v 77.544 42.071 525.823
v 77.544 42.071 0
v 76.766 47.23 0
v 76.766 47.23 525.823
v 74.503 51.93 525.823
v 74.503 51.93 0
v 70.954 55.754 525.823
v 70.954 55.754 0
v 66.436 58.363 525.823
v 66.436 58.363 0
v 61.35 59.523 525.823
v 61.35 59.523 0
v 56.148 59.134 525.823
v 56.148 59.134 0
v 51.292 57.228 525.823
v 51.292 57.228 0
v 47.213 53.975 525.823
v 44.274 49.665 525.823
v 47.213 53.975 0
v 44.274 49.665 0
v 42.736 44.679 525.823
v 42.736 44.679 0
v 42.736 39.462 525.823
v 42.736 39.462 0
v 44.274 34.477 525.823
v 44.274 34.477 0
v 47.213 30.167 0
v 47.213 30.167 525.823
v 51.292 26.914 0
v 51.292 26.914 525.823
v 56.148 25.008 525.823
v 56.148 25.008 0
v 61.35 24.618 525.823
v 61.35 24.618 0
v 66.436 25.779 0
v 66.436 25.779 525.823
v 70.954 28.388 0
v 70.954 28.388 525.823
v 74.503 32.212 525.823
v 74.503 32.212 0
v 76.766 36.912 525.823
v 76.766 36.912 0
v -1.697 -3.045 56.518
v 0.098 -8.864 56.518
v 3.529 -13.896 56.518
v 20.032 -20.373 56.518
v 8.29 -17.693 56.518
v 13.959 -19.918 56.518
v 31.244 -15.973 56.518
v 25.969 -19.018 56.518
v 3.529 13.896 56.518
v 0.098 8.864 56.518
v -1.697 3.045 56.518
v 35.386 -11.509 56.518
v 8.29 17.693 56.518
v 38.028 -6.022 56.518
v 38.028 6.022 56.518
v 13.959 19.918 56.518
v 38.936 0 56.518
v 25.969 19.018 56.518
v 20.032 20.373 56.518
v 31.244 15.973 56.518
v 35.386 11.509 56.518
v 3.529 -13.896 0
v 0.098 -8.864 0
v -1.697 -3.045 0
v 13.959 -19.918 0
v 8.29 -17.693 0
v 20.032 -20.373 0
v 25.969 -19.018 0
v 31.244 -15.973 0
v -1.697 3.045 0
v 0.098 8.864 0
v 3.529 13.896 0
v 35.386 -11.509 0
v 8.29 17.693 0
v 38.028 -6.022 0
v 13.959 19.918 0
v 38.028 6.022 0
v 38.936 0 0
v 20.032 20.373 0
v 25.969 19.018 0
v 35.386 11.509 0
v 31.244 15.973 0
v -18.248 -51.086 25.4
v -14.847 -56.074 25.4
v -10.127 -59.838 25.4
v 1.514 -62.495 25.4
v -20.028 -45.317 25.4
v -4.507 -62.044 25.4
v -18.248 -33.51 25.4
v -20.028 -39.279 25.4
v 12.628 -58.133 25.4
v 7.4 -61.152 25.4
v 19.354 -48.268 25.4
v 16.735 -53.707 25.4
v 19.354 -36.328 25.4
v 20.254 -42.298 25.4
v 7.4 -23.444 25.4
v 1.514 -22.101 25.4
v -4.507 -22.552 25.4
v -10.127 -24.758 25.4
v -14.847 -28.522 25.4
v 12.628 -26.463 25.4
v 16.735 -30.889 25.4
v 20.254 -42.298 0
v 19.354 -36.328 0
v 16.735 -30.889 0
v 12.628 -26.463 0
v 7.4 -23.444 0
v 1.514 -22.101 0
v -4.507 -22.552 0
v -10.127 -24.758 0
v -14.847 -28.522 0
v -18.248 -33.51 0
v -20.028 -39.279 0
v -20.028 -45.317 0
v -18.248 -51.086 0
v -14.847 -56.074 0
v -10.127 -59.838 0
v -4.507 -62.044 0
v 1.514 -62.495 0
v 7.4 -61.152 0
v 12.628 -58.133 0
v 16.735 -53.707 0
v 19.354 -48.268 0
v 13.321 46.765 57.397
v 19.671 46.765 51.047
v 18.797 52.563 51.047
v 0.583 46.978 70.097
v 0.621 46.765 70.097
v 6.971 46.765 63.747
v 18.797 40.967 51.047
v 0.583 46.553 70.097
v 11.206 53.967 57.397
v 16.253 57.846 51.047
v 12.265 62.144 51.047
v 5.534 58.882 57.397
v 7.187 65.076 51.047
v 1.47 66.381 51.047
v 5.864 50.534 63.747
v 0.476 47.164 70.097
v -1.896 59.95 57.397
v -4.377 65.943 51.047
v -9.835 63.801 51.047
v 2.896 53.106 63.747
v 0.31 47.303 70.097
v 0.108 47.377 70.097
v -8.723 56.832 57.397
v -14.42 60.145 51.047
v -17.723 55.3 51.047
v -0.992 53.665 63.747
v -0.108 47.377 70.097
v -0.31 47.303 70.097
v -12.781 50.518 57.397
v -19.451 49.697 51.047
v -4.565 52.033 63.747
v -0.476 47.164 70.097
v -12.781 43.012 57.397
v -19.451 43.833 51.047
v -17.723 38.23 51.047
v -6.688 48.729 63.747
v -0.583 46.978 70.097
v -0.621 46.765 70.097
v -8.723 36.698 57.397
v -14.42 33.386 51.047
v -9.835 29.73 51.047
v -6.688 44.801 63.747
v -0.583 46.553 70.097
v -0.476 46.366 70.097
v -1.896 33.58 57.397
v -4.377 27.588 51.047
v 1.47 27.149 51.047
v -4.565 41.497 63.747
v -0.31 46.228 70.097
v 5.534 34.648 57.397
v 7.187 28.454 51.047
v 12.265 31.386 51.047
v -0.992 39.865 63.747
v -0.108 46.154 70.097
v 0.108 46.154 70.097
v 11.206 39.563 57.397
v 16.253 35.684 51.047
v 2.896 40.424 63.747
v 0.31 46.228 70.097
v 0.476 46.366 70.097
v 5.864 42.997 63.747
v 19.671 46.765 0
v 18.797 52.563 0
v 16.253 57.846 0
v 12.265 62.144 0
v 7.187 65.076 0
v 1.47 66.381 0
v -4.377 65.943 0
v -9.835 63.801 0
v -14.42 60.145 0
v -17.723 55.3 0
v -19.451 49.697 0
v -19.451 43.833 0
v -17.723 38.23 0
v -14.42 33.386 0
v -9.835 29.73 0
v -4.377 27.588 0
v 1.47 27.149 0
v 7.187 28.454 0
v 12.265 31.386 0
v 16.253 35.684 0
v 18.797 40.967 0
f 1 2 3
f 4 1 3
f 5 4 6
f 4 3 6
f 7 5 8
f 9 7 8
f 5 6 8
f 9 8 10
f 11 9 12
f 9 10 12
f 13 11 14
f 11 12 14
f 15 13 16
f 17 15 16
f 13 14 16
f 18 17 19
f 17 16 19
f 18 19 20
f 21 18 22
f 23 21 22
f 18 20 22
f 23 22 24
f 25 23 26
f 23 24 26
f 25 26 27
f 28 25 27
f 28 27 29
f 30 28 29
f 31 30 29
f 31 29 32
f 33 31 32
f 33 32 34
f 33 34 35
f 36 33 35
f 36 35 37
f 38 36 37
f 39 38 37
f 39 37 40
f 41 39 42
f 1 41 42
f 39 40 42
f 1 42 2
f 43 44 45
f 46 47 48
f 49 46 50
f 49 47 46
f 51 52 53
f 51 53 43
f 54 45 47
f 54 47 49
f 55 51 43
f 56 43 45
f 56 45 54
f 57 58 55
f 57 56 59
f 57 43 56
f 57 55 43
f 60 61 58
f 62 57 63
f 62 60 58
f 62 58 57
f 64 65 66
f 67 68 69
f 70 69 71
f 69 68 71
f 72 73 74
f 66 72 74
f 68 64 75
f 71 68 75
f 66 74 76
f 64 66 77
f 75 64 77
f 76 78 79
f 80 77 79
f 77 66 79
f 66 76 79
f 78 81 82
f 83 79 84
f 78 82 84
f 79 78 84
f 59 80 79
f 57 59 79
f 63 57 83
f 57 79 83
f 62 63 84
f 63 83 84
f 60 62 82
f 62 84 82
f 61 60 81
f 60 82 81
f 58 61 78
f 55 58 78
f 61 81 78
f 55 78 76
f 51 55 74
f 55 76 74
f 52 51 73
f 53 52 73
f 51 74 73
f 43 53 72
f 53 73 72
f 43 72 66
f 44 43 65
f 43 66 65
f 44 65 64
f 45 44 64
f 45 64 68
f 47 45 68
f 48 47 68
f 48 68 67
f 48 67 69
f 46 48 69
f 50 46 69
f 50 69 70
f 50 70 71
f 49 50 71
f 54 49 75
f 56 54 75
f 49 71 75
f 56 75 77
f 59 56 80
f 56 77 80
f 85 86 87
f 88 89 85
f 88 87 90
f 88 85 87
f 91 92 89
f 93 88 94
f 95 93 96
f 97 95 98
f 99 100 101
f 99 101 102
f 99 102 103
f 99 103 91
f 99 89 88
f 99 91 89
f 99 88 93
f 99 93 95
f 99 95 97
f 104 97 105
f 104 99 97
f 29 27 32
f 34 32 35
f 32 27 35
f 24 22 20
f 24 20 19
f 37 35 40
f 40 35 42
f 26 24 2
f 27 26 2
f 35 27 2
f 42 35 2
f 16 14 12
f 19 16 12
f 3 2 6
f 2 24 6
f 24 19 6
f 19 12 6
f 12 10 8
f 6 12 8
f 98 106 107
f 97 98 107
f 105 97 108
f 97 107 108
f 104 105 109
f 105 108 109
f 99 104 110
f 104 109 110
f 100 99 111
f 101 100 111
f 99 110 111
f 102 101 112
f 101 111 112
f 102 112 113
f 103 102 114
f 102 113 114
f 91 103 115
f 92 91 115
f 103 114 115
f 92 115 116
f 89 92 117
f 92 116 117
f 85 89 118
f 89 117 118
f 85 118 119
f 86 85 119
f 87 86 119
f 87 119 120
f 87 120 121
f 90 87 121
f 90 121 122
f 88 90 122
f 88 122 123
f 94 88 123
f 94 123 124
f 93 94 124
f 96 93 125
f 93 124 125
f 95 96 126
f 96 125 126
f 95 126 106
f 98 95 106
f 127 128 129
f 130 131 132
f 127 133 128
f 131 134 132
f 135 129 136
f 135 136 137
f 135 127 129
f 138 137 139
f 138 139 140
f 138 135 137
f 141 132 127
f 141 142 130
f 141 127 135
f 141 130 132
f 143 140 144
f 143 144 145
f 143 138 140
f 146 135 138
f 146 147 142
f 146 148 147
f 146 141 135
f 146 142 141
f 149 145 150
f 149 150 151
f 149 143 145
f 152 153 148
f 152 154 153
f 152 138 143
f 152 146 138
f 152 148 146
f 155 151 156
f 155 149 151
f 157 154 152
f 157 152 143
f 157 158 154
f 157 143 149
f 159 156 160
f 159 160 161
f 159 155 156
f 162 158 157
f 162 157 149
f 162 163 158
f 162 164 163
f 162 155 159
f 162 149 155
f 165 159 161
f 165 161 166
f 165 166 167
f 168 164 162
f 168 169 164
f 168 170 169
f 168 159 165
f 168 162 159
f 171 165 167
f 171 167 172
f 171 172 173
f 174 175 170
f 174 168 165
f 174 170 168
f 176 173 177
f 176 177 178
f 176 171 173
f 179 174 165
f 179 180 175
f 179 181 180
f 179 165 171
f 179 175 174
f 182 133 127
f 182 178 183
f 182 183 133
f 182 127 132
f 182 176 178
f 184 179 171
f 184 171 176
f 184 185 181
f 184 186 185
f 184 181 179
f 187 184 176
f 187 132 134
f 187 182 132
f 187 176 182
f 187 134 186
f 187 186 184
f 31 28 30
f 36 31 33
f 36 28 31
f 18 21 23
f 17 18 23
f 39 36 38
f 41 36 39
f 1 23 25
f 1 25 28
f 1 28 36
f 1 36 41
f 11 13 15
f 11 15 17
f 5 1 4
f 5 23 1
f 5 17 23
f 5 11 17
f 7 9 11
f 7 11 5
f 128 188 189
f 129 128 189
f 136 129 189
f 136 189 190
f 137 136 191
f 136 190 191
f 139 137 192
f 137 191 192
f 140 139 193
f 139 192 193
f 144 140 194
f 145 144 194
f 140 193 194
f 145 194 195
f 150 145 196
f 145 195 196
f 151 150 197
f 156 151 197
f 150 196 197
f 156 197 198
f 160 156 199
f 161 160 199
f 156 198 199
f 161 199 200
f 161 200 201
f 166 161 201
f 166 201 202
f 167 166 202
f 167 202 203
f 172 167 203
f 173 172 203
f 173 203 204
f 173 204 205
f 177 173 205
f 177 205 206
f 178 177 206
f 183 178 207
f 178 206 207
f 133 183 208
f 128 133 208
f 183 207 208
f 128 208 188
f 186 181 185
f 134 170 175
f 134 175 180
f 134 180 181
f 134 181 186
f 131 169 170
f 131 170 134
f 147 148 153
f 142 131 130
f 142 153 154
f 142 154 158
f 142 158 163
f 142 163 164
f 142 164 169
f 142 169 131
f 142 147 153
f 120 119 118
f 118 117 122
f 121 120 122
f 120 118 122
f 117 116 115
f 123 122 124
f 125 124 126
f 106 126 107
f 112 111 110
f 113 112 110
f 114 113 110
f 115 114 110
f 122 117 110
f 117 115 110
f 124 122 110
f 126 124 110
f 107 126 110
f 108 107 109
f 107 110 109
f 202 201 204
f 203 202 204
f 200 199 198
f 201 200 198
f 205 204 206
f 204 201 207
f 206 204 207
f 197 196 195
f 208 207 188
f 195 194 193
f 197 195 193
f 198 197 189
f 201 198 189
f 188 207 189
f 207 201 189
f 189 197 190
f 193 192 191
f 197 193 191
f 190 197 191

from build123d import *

# Parameters (mm, degrees)
F0_R      = 20.43056521
F1_DEPTH  = 56.5179139376
F4_R      = 19.6707341592
F5_DEPTH  = 70.09729743
F6_SIZE   = 19.05
F7_R      = 20.2538361839
F8_DEPTH  = 25.4
F9_R      = 17.5014397404
F10_DEPTH = 525.8231759071


# Not quite as in the source:
# - the program builds the solid bodies; features that only make, move or delete a surface that nothing else refers to are left out


with BuildPart() as f1:
    # F0 (on Top) → F1 (new body)
    with BuildSketch(Plane.XY):
        with Locations((18.5053218156, 0)):
            Circle(F0_R)
    extrude(amount=F1_DEPTH)


with BuildPart() as f5:
    # F4 (on Top) → F5 (new body)
    with BuildSketch(Plane.XY):
        with Locations((0, 46.7652082443)):
            Circle(F4_R)
    extrude(amount=F5_DEPTH)

    # F6
    f6_edges = [f5.edges().sort_by_distance(p)[0] for p in [
        (-19.670734, 46.765208, 70.097297),
    ]]
    chamfer(f6_edges, length=F6_SIZE)


with BuildPart() as f8:
    # F7 (on Top) → F8 (new body)
    with BuildSketch(Plane.XY):
        with Locations((0, -42.2979965806)):
            Circle(F7_R)
    extrude(amount=F8_DEPTH)


with BuildPart() as f10:
    # F9 (on Top) → F10 (new body)
    with BuildSketch(Plane.XY):
        with Locations((60.0422769785, 42.0709252357)):
            Circle(F9_R)
    extrude(amount=F10_DEPTH)


solid = Compound([f1.part, f5.part, f8.part, f10.part])
